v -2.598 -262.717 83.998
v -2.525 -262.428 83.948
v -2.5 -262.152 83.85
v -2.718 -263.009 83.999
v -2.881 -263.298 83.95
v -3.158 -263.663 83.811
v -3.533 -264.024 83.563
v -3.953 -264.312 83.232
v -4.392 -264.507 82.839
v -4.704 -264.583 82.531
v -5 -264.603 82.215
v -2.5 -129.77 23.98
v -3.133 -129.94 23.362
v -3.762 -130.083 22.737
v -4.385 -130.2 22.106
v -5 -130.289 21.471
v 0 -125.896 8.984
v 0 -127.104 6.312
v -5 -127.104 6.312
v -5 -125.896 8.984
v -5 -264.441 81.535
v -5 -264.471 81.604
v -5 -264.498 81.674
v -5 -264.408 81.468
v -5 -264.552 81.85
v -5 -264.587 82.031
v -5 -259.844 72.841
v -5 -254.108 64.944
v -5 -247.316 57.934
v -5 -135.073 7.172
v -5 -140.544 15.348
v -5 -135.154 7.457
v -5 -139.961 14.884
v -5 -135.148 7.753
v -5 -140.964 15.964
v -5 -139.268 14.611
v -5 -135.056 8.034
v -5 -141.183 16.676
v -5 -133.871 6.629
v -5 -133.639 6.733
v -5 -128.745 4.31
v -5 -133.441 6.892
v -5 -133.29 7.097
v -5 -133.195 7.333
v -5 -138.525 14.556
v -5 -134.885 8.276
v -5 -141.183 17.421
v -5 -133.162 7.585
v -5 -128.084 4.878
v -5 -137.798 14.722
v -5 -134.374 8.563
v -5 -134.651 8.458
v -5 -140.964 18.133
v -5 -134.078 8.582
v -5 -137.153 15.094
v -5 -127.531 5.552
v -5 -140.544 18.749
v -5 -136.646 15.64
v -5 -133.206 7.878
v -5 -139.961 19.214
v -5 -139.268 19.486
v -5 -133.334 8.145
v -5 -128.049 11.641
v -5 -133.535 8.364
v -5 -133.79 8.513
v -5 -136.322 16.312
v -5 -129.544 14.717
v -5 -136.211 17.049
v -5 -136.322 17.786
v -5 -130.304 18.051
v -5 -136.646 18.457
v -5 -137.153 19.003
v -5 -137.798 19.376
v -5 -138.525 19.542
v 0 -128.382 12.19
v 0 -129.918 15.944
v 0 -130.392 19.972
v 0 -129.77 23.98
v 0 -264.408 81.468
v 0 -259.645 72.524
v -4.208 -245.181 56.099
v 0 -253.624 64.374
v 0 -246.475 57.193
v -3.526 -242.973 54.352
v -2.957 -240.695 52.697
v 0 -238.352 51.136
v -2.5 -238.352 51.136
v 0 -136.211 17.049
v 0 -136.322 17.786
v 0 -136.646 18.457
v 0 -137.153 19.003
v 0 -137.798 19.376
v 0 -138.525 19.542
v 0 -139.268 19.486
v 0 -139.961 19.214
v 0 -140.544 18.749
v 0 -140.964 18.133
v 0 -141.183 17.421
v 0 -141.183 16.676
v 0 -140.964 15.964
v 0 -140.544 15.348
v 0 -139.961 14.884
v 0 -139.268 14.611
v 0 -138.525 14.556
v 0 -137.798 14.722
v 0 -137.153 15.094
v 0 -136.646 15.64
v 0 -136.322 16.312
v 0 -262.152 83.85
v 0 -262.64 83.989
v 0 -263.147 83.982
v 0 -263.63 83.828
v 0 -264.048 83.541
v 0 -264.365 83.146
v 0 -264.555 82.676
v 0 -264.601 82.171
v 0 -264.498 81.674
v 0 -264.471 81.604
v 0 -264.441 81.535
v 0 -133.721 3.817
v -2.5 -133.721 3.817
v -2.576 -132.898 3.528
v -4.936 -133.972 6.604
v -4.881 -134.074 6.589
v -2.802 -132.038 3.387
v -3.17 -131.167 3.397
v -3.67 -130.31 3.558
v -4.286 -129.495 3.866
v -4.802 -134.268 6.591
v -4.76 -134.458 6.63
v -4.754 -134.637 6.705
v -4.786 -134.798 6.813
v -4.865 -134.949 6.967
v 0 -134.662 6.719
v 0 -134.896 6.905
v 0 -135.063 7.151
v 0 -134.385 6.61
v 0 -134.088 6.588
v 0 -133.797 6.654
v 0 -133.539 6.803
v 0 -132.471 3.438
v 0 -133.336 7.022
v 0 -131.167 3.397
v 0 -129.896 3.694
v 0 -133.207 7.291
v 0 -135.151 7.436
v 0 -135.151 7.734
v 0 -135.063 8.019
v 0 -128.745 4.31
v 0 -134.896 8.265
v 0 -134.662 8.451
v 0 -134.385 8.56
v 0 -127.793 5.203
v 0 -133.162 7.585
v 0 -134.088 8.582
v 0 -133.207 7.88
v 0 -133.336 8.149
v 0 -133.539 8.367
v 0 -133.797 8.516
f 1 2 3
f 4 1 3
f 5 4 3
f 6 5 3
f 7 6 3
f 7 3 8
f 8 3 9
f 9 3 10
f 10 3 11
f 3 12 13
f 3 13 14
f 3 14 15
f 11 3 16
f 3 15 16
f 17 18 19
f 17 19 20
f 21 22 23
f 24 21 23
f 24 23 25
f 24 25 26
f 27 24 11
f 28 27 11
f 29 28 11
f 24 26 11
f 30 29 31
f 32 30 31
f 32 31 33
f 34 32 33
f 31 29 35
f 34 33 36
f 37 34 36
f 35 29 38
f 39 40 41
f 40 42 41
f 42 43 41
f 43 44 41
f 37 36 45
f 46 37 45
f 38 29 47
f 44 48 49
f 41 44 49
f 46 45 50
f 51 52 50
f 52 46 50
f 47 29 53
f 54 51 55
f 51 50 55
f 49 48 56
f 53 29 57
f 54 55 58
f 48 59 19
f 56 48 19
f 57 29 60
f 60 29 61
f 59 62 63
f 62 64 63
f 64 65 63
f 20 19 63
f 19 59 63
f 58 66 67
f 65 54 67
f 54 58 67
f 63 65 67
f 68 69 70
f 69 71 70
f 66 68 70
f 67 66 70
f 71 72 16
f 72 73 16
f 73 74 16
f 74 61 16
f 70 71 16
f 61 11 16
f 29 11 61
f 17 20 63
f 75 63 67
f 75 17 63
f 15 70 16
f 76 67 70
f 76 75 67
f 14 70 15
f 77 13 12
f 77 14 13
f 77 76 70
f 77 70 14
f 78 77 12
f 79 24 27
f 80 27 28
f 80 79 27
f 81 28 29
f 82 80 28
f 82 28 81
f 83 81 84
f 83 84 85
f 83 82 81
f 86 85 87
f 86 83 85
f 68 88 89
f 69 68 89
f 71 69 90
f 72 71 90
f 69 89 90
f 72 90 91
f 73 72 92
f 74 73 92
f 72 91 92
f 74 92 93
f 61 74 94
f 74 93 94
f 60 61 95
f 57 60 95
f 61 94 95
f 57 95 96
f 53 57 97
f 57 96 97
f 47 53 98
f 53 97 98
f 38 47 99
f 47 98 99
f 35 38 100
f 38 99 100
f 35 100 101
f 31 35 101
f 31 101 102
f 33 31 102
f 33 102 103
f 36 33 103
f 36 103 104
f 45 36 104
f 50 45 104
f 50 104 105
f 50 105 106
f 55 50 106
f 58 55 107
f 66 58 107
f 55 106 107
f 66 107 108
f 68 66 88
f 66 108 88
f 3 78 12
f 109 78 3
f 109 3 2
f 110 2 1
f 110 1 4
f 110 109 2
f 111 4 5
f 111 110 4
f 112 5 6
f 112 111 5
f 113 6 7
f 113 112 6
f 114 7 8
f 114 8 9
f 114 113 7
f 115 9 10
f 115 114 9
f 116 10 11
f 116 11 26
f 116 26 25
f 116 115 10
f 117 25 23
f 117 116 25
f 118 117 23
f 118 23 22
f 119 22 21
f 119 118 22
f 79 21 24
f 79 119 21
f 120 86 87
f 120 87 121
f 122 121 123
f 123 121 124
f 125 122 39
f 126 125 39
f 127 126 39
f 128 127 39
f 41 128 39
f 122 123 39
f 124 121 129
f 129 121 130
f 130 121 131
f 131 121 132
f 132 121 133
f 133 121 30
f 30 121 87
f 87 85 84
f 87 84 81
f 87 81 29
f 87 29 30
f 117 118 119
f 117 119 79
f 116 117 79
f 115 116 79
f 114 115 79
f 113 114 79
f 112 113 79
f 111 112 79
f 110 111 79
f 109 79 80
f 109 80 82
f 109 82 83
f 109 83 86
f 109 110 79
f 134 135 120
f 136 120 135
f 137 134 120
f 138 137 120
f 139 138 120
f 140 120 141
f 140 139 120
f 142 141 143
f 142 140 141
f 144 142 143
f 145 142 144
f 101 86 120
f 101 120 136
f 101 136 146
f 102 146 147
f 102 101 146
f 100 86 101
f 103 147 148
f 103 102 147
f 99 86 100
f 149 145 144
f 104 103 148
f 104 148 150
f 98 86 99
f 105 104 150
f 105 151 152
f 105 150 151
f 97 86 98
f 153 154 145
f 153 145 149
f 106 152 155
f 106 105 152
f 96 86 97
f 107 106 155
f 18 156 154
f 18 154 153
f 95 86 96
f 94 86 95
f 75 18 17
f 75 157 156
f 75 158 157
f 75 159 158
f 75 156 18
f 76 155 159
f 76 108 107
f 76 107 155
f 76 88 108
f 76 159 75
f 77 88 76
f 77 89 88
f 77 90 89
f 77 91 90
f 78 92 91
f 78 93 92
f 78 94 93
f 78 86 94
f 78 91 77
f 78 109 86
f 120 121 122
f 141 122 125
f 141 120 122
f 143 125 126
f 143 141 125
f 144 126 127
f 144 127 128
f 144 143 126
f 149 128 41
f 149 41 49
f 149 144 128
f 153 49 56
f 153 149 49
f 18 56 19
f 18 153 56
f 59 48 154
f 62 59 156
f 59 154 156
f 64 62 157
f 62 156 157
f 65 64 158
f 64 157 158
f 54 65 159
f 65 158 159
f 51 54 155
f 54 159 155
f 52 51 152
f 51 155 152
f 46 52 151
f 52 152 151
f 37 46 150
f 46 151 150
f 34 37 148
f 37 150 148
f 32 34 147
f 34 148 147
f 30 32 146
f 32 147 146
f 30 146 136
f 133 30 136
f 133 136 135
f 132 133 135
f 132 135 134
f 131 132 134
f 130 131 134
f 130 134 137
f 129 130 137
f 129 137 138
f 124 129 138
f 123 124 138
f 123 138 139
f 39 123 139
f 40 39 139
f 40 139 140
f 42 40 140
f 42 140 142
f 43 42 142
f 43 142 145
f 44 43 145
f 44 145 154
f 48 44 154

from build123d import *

# Parameters (mm, degrees)
F0_R        = 1
F0_R_2      = 2.5
F1_DEPTH    = 5
F2_T1_DEPTH = 140.5508565822
F2_T3_DEPTH = 158.1494237613


# Not quite as in the source:
# - a fillet or chamfer that OpenCascade refuses, or shapes differently, is made with other operations: its cross-section is extruded or revolved along the edge and cut away or added


with BuildPart() as f1:
    # F0 (on Right) → F1 (new body)
    with BuildSketch(Plane.YZ):
        with BuildLine():
            Line((-238.351838073, 51.1362271676), (-133.7205907933, 3.81650843))
            ThreePointArc((-133.7205907933, 3.81650843), (-129.8957188572, 3.6939702207), (-127.1044783752, 6.3119155052))
            Line((-127.1044783752, 6.3119155052), (-125.8958157643, 8.9844562534))
            ThreePointArc((-125.8958157643, 8.9844562534), (-129.9178817918, 15.9435567205), (-129.7697865993, 23.9799839275))
            Line((-129.7697865993, 23.9799839275), (-224.5101433949, 66.8265250251))
            Line((-224.5101433949, 66.8265250251), (-262.1519725075, 83.8501275596))
            ThreePointArc((-262.1519725075, 83.8501275596), (-264.0478442183, 83.5411975558), (-264.4983908426, 81.6739067294))
            ThreePointArc((-264.4983908426, 81.6739067294), (-264.4532671282, 81.571051598), (-264.4079761186, 81.4682700232))
            ThreePointArc((-264.4079761186, 81.4682700232), (-253.6243159552, 64.3742338109), (-238.351838073, 51.1362271676))
        make_face()
        with Locations((-134.1624917959, 7.5852589493)):
            Circle(F0_R, mode=Mode.SUBTRACT)
        with Locations((-138.7114049438, 17.0487332662)):
            Circle(F0_R_2, mode=Mode.SUBTRACT)
        with BuildLine():
            ThreePointArc((-264.4983908426, 81.6739067294), (-264.4565130864, 81.5696244091), (-264.4079761186, 81.4682700232))
            ThreePointArc((-264.4079761186, 81.4682700232), (-264.4532671282, 81.571051598), (-264.4983908426, 81.6739067294))
        make_face()
    extrude(amount=-F1_DEPTH)

    # F2: chamfer of 2.5 on 2 edges, made by hand

    # F2_s2 → F2_t1 (cut)
    with BuildSketch(Plane(origin=(0, -234.652694271, 106.1222128437), x_dir=(1, 0, 0), z_dir=(0, 0.9111519493, -0.4120705343))):
        Polygon((-2.5, 51.6248961977), (-5, 49.1248961977), (-5, 51.6248961977), align=None)
    extrude(amount=F2_T1_DEPTH, mode=Mode.SUBTRACT)

    # F2_s4 → F2_t3 (cut)
    with BuildSketch(Plane(origin=(0, -110.8801138075, 50.1457827883), x_dir=(1, 0, 0), z_dir=(0, -0.9111519493, 0.4120705343))):
        Polygon((-2.5, -31.6248961977), (-5, -34.1248961977), (-5, -31.6248961977), align=None)
    extrude(amount=F2_T3_DEPTH, mode=Mode.SUBTRACT)


solid = f1.part
